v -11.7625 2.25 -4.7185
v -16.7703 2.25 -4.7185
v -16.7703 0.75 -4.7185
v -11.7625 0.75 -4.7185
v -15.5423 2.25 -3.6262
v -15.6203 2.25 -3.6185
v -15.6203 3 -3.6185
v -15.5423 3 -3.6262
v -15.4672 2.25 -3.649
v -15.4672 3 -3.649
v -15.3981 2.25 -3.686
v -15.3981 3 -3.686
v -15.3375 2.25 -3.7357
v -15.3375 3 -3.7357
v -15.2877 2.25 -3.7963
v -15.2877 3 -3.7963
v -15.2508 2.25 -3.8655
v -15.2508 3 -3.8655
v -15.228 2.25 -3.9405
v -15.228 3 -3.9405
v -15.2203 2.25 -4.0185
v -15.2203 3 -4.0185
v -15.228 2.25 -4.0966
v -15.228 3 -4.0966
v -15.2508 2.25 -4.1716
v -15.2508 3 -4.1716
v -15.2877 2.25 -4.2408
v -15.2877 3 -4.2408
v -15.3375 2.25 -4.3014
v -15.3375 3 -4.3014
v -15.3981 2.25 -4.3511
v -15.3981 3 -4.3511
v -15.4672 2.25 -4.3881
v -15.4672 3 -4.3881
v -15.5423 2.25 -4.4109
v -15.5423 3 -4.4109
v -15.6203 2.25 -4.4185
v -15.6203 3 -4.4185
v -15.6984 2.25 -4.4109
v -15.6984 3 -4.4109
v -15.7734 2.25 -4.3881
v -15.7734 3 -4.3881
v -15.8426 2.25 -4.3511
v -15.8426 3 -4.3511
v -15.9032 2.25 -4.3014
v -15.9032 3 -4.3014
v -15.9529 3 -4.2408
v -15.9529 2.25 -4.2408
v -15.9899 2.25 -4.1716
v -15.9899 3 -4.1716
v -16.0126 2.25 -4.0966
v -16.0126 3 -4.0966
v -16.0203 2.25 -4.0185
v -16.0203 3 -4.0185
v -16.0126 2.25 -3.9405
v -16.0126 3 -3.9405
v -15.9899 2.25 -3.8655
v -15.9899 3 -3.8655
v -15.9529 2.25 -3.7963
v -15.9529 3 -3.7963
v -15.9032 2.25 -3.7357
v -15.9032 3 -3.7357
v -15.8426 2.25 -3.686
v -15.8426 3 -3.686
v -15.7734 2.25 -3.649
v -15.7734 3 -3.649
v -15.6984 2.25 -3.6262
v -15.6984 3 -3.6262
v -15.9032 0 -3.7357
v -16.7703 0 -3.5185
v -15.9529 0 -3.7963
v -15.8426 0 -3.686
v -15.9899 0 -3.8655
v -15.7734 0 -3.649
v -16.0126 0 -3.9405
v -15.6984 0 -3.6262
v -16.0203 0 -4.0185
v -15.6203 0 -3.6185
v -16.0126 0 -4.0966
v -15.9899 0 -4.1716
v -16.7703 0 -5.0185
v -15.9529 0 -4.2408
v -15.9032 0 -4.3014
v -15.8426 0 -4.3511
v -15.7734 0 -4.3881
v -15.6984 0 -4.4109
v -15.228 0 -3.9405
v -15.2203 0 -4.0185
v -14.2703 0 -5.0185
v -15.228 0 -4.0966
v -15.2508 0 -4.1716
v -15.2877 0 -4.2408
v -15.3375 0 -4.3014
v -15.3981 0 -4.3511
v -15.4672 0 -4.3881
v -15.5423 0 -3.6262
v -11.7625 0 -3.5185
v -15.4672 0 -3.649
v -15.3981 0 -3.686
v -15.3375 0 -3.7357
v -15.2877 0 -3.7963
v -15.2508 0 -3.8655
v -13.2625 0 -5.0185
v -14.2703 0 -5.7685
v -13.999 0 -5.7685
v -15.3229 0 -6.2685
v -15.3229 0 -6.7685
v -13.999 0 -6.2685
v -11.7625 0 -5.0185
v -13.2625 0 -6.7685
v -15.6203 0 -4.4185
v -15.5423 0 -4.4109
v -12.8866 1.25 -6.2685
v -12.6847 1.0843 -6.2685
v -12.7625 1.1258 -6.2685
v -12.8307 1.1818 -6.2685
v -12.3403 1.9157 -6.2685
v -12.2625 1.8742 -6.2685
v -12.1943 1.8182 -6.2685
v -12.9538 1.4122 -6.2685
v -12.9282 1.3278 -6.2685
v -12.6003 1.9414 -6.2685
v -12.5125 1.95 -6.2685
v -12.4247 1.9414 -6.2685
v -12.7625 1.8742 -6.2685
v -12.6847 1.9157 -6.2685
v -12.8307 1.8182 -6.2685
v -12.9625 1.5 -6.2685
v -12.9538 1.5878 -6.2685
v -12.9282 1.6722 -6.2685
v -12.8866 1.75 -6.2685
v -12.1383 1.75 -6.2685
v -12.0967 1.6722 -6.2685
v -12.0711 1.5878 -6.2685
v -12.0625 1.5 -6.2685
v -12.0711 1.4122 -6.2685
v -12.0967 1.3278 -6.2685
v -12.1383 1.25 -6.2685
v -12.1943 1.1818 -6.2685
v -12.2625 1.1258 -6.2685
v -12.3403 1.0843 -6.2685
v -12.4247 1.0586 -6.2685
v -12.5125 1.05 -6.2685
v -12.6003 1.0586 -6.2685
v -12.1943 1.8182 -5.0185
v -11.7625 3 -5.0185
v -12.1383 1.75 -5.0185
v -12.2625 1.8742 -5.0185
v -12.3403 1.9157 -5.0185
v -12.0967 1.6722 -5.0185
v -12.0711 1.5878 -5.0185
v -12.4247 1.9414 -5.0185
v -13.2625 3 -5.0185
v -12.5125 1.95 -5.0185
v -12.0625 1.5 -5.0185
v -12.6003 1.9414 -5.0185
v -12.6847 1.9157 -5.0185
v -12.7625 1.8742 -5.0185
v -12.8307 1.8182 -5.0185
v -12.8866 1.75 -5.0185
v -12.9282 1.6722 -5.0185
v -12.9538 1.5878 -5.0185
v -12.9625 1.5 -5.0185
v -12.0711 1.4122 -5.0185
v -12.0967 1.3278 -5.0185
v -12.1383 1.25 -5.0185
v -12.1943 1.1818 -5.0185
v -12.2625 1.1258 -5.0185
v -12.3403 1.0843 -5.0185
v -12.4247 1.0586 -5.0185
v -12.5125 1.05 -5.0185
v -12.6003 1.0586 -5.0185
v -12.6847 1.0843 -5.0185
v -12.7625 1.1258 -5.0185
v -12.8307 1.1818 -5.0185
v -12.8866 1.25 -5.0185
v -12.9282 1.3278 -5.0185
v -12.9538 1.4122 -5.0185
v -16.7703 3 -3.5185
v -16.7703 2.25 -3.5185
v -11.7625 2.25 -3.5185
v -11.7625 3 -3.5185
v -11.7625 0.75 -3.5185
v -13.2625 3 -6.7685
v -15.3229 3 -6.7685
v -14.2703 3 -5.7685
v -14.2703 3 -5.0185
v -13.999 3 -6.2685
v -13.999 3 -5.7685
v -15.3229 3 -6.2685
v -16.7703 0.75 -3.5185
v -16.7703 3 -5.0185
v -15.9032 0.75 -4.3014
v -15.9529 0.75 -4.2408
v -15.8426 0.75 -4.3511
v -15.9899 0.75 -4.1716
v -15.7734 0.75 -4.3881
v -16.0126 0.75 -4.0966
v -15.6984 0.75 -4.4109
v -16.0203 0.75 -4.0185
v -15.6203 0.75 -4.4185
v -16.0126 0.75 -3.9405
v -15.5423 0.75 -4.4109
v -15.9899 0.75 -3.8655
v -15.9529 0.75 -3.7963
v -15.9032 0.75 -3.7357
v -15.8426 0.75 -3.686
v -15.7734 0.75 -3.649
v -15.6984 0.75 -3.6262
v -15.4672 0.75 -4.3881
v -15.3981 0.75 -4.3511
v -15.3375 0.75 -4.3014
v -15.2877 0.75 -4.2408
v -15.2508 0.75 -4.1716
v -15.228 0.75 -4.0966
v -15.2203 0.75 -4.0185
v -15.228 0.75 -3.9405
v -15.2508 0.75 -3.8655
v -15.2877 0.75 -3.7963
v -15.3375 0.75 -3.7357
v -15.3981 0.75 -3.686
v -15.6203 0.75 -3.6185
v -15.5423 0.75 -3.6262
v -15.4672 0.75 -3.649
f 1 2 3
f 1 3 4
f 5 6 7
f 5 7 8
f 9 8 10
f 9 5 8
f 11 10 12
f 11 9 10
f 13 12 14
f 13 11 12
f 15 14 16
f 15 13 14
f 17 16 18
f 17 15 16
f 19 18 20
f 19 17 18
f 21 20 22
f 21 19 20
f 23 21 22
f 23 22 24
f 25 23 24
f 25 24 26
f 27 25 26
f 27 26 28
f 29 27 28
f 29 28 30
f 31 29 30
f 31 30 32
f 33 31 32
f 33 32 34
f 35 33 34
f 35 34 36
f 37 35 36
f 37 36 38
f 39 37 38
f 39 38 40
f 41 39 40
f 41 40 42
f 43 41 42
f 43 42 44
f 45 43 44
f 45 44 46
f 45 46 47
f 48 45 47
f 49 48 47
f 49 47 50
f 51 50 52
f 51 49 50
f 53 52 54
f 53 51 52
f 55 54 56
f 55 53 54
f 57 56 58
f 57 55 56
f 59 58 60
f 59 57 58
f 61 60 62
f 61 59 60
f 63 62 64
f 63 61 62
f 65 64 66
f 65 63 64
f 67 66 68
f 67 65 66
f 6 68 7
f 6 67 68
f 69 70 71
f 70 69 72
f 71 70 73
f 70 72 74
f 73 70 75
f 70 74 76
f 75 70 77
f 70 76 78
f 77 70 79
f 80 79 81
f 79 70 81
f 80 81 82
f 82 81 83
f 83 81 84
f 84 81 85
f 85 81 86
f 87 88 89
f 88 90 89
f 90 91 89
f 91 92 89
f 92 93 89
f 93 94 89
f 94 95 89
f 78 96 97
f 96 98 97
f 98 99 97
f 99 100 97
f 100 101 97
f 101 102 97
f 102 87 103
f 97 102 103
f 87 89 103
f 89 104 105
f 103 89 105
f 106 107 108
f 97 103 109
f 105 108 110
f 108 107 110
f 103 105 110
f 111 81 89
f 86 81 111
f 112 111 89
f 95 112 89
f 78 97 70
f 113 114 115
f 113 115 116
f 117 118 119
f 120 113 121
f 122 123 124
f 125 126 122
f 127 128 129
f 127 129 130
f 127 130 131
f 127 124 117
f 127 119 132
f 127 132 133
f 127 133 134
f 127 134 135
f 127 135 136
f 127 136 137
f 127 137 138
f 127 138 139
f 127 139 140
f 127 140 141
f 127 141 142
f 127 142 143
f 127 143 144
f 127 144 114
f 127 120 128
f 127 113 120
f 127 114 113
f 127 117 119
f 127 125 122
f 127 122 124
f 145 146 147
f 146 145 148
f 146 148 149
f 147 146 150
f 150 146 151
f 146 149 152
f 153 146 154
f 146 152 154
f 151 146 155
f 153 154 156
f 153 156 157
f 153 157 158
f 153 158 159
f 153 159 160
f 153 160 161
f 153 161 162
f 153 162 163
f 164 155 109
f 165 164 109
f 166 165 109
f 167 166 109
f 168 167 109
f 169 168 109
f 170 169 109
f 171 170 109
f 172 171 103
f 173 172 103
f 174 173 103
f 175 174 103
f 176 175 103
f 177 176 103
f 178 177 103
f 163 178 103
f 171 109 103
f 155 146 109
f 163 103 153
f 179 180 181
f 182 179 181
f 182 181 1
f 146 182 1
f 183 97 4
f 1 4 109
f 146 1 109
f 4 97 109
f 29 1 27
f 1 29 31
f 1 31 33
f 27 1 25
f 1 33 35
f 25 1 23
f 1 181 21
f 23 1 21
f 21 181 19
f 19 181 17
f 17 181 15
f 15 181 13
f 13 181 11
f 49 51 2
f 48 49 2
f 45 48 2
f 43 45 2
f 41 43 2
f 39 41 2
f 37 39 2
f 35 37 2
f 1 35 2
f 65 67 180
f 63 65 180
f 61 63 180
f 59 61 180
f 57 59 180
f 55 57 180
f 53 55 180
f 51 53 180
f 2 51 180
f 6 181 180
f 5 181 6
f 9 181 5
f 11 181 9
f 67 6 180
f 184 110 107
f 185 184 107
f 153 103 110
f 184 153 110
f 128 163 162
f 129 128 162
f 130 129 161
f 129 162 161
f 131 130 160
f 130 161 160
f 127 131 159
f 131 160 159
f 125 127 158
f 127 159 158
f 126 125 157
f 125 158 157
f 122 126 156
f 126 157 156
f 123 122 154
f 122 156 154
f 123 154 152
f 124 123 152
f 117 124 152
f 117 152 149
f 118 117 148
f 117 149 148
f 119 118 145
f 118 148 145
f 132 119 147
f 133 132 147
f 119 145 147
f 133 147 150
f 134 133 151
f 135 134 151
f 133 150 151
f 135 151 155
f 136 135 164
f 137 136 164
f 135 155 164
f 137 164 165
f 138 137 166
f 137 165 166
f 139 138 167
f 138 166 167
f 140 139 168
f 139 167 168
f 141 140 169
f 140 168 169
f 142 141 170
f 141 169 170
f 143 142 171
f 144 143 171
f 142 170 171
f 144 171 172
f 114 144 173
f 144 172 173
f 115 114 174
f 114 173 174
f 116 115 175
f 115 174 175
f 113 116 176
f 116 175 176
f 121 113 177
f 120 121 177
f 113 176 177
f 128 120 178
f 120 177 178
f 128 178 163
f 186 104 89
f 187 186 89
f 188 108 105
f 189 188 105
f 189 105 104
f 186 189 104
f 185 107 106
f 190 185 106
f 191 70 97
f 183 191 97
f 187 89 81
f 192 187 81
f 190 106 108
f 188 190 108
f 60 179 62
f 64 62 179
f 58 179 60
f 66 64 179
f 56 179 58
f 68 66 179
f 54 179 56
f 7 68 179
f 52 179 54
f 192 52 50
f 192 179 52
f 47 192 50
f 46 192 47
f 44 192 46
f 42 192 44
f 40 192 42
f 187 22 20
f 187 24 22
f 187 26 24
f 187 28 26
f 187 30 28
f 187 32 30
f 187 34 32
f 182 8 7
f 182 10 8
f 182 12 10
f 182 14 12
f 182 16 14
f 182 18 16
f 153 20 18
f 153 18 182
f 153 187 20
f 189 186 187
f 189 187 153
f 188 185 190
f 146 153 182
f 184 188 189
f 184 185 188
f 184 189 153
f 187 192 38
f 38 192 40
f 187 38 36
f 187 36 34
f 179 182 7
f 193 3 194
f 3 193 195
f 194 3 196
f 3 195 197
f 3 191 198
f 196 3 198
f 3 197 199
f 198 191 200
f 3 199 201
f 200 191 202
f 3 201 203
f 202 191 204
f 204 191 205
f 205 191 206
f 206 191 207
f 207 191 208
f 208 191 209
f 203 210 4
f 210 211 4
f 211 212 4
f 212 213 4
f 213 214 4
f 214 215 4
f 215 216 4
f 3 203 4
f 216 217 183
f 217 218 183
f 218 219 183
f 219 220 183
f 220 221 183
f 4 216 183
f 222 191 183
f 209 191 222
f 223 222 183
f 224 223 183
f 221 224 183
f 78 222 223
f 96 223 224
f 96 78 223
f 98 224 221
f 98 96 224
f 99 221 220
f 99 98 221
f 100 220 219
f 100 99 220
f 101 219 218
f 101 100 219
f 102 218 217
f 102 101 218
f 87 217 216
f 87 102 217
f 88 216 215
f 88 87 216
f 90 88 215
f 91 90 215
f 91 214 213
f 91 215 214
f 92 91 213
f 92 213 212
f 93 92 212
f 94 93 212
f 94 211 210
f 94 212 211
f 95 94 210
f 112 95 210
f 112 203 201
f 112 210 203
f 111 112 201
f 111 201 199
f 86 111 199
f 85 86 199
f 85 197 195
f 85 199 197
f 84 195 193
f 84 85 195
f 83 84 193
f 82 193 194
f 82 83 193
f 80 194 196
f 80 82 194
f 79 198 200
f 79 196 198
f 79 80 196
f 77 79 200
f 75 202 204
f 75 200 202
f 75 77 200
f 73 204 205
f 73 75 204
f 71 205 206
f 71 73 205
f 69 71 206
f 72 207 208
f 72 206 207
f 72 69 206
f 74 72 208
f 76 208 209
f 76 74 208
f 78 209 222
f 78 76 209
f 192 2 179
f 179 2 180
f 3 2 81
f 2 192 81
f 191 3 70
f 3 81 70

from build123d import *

# Parameters (mm, degrees)
SKETCH1_R           = 0.4
BOSS_EXTRUDE1_DEPTH = 3
SKETCH2_W           = 2.503917826
SKETCH2_H           = 0.75
SKETCH2_W_2         = 2.503917827
CUT_EXTRUDE1_DEPTH  = 1.2
SKETCH3_R           = 0.45
BOSS_EXTRUDE2_DEPTH = 1.25


with BuildPart() as part:
    # Sketch1 → Boss-Extrude1 (new body)
    with BuildSketch(Plane(origin=(0, 0, 0), x_dir=(1, 0, 0), z_dir=(0, 1, 0))):
        Polygon((-14.270322025, 5.01853909), (-16.770322025, 5.01853909), (-16.770322025, 4.01853909), (-16.770322025, 3.51853909), (-11.762486372, 3.51853909), (-11.762486372, 5.01853909), (-13.262486372, 5.01853909), (-13.262486372, 6.76853909), (-15.322928397, 6.76853909), (-15.322928397, 6.26853909), (-13.999008371, 6.26853909), (-13.999008371, 5.76853909), (-14.270322025, 5.76853909), align=None)
        with Locations(Location((-15.620322025, 4.01853909, 0), (0, 0, 270))):
            Circle(SKETCH1_R, mode=Mode.SUBTRACT)
    extrude(amount=BOSS_EXTRUDE1_DEPTH)

    # Sketch2 → Cut-Extrude1 (cut)
    with BuildSketch(Plane.XY.offset(-3.51853909)):
        with Locations((-15.518363112, 1.875)):
            Rectangle(SKETCH2_W, SKETCH2_H)
        with Locations((-13.014445286, 1.875)):
            Rectangle(SKETCH2_W_2, SKETCH2_H)
        with Locations((-15.518363112, 1.125)):
            Rectangle(SKETCH2_W, SKETCH2_H)
        with Locations((-13.014445286, 1.125)):
            Rectangle(SKETCH2_W_2, SKETCH2_H)
    extrude(amount=-CUT_EXTRUDE1_DEPTH, mode=Mode.SUBTRACT)

    # Sketch3 → Boss-Extrude2 (add)
    with BuildSketch(Plane(origin=(0, 0, -5.01853909), x_dir=(-1, 0, 0), z_dir=(0, 0, -1))):
        with Locations((12.512486372, 1.5)):
            Circle(SKETCH3_R)
    extrude(amount=BOSS_EXTRUDE2_DEPTH)


solid = part.part
